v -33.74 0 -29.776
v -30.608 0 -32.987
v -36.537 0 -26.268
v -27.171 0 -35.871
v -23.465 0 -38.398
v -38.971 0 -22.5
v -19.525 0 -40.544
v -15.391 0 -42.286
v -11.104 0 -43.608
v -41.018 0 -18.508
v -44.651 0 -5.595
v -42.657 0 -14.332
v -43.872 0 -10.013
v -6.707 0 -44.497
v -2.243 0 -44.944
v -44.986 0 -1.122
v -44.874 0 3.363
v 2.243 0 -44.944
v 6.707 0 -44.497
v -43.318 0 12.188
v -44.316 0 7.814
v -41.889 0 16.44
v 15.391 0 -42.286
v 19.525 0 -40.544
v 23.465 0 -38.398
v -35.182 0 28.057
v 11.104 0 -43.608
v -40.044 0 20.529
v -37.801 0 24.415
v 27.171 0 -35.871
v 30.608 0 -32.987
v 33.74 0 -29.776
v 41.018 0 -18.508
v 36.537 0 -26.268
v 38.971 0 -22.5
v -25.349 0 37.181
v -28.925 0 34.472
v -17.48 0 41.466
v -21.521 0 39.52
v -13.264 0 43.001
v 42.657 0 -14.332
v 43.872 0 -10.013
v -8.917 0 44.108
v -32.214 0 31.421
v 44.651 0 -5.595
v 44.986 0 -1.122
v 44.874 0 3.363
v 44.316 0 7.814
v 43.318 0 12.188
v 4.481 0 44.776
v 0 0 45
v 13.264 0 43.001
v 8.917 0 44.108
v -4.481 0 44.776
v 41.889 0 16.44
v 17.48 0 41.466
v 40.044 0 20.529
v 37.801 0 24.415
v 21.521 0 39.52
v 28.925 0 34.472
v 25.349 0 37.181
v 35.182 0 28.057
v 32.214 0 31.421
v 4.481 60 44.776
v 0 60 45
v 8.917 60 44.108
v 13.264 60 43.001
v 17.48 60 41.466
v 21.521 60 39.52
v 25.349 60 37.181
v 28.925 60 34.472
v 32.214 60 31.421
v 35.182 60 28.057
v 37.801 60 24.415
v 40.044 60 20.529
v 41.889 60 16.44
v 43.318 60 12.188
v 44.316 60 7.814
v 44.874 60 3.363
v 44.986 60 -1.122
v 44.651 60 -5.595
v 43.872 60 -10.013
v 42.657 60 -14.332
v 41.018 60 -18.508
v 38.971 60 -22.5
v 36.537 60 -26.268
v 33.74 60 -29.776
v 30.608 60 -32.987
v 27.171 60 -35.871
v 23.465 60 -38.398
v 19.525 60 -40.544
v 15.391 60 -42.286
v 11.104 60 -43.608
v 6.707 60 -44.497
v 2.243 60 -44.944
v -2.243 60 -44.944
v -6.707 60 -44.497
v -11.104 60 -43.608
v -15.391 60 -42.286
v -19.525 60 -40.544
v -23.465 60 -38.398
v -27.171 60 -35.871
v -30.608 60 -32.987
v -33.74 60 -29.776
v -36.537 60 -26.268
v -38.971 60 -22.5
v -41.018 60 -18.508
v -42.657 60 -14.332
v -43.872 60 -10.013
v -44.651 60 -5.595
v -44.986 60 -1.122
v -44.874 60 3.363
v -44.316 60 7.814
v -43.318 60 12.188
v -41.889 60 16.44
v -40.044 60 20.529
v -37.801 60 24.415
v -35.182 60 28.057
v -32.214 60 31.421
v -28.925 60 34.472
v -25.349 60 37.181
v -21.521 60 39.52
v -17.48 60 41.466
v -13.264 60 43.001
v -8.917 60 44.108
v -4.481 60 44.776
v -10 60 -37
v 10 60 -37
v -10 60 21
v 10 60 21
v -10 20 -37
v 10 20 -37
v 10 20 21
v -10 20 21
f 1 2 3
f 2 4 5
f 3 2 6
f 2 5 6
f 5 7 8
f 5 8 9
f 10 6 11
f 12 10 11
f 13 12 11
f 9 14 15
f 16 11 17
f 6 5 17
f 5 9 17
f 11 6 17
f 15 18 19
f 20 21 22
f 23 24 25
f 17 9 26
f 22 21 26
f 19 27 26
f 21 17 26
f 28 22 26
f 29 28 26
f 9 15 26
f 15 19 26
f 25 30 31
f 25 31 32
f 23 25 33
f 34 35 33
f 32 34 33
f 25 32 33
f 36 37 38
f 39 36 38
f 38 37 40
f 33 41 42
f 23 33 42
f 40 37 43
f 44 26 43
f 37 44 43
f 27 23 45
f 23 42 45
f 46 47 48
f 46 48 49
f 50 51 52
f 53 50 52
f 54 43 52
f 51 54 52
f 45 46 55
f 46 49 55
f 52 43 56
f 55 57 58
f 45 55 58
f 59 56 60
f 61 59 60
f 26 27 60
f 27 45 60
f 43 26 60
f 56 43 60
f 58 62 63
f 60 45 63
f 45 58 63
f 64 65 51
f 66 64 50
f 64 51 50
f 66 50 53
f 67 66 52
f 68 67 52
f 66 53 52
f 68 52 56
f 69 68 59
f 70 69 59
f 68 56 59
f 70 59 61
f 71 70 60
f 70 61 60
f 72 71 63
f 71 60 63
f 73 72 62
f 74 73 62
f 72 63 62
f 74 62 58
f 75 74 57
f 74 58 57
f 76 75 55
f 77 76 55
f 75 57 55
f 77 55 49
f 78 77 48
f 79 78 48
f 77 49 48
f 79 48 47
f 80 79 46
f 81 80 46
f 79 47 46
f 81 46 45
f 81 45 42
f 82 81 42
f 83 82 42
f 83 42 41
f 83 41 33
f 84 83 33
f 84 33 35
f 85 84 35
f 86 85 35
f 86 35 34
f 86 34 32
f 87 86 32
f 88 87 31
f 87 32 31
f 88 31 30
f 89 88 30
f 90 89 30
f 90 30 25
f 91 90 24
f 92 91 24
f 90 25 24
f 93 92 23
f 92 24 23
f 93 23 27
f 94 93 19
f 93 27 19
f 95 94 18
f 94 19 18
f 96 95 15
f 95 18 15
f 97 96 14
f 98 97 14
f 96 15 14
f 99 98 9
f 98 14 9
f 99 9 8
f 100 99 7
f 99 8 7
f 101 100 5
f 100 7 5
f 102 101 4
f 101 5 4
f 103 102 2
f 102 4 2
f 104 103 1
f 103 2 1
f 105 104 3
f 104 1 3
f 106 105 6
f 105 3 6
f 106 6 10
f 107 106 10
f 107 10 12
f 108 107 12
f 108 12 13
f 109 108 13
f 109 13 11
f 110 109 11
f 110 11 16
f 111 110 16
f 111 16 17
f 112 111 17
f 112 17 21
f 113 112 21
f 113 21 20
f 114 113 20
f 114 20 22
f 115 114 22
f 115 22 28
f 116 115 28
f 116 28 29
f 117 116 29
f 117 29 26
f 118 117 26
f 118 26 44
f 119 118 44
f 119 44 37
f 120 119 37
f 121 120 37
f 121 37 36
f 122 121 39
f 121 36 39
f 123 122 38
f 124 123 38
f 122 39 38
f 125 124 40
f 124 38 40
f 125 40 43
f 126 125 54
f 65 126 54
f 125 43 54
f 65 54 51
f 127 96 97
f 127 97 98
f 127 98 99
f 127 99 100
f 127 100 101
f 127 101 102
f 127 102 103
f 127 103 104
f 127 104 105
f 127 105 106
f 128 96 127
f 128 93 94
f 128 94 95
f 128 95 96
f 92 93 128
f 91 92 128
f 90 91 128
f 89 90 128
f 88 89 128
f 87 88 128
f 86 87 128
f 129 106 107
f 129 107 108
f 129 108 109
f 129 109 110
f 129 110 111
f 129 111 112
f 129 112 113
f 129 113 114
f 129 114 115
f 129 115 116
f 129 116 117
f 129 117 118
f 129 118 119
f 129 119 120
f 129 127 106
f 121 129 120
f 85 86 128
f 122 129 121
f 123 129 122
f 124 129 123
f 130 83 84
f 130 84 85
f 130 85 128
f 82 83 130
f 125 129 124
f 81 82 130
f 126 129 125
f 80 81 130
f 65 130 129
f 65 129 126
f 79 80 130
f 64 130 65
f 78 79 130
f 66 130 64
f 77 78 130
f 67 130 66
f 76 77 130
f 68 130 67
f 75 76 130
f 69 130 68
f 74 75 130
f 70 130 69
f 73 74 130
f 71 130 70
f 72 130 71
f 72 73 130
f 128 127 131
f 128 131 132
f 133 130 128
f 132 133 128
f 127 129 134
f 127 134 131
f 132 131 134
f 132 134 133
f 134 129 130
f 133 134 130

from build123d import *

# Parameters (mm, degrees)
SKETCH1_R           = 45
BOSS_EXTRUDE1_DEPTH = 60
SKETCH2_W           = 20
SKETCH2_H           = 58
CUT_EXTRUDE1_DEPTH  = 40


with BuildPart() as part:
    # Sketch1 → Boss-Extrude1 (new body)
    with BuildSketch(Plane(origin=(0, 0, 0), x_dir=(1, 0, 0), z_dir=(0, 1, 0))):
        with Locations(Location((0, 0, 0), (0, 0, 270))):
            Circle(SKETCH1_R)
    extrude(amount=BOSS_EXTRUDE1_DEPTH)

    # Sketch2 → Cut-Extrude1 (cut)
    with BuildSketch(Plane(origin=(0, 60, 0), x_dir=(1, 0, 0), z_dir=(0, 1, 0))):
        with Locations((0, 8)):
            Rectangle(SKETCH2_W, SKETCH2_H)
    extrude(amount=-CUT_EXTRUDE1_DEPTH, mode=Mode.SUBTRACT)


solid = part.part
